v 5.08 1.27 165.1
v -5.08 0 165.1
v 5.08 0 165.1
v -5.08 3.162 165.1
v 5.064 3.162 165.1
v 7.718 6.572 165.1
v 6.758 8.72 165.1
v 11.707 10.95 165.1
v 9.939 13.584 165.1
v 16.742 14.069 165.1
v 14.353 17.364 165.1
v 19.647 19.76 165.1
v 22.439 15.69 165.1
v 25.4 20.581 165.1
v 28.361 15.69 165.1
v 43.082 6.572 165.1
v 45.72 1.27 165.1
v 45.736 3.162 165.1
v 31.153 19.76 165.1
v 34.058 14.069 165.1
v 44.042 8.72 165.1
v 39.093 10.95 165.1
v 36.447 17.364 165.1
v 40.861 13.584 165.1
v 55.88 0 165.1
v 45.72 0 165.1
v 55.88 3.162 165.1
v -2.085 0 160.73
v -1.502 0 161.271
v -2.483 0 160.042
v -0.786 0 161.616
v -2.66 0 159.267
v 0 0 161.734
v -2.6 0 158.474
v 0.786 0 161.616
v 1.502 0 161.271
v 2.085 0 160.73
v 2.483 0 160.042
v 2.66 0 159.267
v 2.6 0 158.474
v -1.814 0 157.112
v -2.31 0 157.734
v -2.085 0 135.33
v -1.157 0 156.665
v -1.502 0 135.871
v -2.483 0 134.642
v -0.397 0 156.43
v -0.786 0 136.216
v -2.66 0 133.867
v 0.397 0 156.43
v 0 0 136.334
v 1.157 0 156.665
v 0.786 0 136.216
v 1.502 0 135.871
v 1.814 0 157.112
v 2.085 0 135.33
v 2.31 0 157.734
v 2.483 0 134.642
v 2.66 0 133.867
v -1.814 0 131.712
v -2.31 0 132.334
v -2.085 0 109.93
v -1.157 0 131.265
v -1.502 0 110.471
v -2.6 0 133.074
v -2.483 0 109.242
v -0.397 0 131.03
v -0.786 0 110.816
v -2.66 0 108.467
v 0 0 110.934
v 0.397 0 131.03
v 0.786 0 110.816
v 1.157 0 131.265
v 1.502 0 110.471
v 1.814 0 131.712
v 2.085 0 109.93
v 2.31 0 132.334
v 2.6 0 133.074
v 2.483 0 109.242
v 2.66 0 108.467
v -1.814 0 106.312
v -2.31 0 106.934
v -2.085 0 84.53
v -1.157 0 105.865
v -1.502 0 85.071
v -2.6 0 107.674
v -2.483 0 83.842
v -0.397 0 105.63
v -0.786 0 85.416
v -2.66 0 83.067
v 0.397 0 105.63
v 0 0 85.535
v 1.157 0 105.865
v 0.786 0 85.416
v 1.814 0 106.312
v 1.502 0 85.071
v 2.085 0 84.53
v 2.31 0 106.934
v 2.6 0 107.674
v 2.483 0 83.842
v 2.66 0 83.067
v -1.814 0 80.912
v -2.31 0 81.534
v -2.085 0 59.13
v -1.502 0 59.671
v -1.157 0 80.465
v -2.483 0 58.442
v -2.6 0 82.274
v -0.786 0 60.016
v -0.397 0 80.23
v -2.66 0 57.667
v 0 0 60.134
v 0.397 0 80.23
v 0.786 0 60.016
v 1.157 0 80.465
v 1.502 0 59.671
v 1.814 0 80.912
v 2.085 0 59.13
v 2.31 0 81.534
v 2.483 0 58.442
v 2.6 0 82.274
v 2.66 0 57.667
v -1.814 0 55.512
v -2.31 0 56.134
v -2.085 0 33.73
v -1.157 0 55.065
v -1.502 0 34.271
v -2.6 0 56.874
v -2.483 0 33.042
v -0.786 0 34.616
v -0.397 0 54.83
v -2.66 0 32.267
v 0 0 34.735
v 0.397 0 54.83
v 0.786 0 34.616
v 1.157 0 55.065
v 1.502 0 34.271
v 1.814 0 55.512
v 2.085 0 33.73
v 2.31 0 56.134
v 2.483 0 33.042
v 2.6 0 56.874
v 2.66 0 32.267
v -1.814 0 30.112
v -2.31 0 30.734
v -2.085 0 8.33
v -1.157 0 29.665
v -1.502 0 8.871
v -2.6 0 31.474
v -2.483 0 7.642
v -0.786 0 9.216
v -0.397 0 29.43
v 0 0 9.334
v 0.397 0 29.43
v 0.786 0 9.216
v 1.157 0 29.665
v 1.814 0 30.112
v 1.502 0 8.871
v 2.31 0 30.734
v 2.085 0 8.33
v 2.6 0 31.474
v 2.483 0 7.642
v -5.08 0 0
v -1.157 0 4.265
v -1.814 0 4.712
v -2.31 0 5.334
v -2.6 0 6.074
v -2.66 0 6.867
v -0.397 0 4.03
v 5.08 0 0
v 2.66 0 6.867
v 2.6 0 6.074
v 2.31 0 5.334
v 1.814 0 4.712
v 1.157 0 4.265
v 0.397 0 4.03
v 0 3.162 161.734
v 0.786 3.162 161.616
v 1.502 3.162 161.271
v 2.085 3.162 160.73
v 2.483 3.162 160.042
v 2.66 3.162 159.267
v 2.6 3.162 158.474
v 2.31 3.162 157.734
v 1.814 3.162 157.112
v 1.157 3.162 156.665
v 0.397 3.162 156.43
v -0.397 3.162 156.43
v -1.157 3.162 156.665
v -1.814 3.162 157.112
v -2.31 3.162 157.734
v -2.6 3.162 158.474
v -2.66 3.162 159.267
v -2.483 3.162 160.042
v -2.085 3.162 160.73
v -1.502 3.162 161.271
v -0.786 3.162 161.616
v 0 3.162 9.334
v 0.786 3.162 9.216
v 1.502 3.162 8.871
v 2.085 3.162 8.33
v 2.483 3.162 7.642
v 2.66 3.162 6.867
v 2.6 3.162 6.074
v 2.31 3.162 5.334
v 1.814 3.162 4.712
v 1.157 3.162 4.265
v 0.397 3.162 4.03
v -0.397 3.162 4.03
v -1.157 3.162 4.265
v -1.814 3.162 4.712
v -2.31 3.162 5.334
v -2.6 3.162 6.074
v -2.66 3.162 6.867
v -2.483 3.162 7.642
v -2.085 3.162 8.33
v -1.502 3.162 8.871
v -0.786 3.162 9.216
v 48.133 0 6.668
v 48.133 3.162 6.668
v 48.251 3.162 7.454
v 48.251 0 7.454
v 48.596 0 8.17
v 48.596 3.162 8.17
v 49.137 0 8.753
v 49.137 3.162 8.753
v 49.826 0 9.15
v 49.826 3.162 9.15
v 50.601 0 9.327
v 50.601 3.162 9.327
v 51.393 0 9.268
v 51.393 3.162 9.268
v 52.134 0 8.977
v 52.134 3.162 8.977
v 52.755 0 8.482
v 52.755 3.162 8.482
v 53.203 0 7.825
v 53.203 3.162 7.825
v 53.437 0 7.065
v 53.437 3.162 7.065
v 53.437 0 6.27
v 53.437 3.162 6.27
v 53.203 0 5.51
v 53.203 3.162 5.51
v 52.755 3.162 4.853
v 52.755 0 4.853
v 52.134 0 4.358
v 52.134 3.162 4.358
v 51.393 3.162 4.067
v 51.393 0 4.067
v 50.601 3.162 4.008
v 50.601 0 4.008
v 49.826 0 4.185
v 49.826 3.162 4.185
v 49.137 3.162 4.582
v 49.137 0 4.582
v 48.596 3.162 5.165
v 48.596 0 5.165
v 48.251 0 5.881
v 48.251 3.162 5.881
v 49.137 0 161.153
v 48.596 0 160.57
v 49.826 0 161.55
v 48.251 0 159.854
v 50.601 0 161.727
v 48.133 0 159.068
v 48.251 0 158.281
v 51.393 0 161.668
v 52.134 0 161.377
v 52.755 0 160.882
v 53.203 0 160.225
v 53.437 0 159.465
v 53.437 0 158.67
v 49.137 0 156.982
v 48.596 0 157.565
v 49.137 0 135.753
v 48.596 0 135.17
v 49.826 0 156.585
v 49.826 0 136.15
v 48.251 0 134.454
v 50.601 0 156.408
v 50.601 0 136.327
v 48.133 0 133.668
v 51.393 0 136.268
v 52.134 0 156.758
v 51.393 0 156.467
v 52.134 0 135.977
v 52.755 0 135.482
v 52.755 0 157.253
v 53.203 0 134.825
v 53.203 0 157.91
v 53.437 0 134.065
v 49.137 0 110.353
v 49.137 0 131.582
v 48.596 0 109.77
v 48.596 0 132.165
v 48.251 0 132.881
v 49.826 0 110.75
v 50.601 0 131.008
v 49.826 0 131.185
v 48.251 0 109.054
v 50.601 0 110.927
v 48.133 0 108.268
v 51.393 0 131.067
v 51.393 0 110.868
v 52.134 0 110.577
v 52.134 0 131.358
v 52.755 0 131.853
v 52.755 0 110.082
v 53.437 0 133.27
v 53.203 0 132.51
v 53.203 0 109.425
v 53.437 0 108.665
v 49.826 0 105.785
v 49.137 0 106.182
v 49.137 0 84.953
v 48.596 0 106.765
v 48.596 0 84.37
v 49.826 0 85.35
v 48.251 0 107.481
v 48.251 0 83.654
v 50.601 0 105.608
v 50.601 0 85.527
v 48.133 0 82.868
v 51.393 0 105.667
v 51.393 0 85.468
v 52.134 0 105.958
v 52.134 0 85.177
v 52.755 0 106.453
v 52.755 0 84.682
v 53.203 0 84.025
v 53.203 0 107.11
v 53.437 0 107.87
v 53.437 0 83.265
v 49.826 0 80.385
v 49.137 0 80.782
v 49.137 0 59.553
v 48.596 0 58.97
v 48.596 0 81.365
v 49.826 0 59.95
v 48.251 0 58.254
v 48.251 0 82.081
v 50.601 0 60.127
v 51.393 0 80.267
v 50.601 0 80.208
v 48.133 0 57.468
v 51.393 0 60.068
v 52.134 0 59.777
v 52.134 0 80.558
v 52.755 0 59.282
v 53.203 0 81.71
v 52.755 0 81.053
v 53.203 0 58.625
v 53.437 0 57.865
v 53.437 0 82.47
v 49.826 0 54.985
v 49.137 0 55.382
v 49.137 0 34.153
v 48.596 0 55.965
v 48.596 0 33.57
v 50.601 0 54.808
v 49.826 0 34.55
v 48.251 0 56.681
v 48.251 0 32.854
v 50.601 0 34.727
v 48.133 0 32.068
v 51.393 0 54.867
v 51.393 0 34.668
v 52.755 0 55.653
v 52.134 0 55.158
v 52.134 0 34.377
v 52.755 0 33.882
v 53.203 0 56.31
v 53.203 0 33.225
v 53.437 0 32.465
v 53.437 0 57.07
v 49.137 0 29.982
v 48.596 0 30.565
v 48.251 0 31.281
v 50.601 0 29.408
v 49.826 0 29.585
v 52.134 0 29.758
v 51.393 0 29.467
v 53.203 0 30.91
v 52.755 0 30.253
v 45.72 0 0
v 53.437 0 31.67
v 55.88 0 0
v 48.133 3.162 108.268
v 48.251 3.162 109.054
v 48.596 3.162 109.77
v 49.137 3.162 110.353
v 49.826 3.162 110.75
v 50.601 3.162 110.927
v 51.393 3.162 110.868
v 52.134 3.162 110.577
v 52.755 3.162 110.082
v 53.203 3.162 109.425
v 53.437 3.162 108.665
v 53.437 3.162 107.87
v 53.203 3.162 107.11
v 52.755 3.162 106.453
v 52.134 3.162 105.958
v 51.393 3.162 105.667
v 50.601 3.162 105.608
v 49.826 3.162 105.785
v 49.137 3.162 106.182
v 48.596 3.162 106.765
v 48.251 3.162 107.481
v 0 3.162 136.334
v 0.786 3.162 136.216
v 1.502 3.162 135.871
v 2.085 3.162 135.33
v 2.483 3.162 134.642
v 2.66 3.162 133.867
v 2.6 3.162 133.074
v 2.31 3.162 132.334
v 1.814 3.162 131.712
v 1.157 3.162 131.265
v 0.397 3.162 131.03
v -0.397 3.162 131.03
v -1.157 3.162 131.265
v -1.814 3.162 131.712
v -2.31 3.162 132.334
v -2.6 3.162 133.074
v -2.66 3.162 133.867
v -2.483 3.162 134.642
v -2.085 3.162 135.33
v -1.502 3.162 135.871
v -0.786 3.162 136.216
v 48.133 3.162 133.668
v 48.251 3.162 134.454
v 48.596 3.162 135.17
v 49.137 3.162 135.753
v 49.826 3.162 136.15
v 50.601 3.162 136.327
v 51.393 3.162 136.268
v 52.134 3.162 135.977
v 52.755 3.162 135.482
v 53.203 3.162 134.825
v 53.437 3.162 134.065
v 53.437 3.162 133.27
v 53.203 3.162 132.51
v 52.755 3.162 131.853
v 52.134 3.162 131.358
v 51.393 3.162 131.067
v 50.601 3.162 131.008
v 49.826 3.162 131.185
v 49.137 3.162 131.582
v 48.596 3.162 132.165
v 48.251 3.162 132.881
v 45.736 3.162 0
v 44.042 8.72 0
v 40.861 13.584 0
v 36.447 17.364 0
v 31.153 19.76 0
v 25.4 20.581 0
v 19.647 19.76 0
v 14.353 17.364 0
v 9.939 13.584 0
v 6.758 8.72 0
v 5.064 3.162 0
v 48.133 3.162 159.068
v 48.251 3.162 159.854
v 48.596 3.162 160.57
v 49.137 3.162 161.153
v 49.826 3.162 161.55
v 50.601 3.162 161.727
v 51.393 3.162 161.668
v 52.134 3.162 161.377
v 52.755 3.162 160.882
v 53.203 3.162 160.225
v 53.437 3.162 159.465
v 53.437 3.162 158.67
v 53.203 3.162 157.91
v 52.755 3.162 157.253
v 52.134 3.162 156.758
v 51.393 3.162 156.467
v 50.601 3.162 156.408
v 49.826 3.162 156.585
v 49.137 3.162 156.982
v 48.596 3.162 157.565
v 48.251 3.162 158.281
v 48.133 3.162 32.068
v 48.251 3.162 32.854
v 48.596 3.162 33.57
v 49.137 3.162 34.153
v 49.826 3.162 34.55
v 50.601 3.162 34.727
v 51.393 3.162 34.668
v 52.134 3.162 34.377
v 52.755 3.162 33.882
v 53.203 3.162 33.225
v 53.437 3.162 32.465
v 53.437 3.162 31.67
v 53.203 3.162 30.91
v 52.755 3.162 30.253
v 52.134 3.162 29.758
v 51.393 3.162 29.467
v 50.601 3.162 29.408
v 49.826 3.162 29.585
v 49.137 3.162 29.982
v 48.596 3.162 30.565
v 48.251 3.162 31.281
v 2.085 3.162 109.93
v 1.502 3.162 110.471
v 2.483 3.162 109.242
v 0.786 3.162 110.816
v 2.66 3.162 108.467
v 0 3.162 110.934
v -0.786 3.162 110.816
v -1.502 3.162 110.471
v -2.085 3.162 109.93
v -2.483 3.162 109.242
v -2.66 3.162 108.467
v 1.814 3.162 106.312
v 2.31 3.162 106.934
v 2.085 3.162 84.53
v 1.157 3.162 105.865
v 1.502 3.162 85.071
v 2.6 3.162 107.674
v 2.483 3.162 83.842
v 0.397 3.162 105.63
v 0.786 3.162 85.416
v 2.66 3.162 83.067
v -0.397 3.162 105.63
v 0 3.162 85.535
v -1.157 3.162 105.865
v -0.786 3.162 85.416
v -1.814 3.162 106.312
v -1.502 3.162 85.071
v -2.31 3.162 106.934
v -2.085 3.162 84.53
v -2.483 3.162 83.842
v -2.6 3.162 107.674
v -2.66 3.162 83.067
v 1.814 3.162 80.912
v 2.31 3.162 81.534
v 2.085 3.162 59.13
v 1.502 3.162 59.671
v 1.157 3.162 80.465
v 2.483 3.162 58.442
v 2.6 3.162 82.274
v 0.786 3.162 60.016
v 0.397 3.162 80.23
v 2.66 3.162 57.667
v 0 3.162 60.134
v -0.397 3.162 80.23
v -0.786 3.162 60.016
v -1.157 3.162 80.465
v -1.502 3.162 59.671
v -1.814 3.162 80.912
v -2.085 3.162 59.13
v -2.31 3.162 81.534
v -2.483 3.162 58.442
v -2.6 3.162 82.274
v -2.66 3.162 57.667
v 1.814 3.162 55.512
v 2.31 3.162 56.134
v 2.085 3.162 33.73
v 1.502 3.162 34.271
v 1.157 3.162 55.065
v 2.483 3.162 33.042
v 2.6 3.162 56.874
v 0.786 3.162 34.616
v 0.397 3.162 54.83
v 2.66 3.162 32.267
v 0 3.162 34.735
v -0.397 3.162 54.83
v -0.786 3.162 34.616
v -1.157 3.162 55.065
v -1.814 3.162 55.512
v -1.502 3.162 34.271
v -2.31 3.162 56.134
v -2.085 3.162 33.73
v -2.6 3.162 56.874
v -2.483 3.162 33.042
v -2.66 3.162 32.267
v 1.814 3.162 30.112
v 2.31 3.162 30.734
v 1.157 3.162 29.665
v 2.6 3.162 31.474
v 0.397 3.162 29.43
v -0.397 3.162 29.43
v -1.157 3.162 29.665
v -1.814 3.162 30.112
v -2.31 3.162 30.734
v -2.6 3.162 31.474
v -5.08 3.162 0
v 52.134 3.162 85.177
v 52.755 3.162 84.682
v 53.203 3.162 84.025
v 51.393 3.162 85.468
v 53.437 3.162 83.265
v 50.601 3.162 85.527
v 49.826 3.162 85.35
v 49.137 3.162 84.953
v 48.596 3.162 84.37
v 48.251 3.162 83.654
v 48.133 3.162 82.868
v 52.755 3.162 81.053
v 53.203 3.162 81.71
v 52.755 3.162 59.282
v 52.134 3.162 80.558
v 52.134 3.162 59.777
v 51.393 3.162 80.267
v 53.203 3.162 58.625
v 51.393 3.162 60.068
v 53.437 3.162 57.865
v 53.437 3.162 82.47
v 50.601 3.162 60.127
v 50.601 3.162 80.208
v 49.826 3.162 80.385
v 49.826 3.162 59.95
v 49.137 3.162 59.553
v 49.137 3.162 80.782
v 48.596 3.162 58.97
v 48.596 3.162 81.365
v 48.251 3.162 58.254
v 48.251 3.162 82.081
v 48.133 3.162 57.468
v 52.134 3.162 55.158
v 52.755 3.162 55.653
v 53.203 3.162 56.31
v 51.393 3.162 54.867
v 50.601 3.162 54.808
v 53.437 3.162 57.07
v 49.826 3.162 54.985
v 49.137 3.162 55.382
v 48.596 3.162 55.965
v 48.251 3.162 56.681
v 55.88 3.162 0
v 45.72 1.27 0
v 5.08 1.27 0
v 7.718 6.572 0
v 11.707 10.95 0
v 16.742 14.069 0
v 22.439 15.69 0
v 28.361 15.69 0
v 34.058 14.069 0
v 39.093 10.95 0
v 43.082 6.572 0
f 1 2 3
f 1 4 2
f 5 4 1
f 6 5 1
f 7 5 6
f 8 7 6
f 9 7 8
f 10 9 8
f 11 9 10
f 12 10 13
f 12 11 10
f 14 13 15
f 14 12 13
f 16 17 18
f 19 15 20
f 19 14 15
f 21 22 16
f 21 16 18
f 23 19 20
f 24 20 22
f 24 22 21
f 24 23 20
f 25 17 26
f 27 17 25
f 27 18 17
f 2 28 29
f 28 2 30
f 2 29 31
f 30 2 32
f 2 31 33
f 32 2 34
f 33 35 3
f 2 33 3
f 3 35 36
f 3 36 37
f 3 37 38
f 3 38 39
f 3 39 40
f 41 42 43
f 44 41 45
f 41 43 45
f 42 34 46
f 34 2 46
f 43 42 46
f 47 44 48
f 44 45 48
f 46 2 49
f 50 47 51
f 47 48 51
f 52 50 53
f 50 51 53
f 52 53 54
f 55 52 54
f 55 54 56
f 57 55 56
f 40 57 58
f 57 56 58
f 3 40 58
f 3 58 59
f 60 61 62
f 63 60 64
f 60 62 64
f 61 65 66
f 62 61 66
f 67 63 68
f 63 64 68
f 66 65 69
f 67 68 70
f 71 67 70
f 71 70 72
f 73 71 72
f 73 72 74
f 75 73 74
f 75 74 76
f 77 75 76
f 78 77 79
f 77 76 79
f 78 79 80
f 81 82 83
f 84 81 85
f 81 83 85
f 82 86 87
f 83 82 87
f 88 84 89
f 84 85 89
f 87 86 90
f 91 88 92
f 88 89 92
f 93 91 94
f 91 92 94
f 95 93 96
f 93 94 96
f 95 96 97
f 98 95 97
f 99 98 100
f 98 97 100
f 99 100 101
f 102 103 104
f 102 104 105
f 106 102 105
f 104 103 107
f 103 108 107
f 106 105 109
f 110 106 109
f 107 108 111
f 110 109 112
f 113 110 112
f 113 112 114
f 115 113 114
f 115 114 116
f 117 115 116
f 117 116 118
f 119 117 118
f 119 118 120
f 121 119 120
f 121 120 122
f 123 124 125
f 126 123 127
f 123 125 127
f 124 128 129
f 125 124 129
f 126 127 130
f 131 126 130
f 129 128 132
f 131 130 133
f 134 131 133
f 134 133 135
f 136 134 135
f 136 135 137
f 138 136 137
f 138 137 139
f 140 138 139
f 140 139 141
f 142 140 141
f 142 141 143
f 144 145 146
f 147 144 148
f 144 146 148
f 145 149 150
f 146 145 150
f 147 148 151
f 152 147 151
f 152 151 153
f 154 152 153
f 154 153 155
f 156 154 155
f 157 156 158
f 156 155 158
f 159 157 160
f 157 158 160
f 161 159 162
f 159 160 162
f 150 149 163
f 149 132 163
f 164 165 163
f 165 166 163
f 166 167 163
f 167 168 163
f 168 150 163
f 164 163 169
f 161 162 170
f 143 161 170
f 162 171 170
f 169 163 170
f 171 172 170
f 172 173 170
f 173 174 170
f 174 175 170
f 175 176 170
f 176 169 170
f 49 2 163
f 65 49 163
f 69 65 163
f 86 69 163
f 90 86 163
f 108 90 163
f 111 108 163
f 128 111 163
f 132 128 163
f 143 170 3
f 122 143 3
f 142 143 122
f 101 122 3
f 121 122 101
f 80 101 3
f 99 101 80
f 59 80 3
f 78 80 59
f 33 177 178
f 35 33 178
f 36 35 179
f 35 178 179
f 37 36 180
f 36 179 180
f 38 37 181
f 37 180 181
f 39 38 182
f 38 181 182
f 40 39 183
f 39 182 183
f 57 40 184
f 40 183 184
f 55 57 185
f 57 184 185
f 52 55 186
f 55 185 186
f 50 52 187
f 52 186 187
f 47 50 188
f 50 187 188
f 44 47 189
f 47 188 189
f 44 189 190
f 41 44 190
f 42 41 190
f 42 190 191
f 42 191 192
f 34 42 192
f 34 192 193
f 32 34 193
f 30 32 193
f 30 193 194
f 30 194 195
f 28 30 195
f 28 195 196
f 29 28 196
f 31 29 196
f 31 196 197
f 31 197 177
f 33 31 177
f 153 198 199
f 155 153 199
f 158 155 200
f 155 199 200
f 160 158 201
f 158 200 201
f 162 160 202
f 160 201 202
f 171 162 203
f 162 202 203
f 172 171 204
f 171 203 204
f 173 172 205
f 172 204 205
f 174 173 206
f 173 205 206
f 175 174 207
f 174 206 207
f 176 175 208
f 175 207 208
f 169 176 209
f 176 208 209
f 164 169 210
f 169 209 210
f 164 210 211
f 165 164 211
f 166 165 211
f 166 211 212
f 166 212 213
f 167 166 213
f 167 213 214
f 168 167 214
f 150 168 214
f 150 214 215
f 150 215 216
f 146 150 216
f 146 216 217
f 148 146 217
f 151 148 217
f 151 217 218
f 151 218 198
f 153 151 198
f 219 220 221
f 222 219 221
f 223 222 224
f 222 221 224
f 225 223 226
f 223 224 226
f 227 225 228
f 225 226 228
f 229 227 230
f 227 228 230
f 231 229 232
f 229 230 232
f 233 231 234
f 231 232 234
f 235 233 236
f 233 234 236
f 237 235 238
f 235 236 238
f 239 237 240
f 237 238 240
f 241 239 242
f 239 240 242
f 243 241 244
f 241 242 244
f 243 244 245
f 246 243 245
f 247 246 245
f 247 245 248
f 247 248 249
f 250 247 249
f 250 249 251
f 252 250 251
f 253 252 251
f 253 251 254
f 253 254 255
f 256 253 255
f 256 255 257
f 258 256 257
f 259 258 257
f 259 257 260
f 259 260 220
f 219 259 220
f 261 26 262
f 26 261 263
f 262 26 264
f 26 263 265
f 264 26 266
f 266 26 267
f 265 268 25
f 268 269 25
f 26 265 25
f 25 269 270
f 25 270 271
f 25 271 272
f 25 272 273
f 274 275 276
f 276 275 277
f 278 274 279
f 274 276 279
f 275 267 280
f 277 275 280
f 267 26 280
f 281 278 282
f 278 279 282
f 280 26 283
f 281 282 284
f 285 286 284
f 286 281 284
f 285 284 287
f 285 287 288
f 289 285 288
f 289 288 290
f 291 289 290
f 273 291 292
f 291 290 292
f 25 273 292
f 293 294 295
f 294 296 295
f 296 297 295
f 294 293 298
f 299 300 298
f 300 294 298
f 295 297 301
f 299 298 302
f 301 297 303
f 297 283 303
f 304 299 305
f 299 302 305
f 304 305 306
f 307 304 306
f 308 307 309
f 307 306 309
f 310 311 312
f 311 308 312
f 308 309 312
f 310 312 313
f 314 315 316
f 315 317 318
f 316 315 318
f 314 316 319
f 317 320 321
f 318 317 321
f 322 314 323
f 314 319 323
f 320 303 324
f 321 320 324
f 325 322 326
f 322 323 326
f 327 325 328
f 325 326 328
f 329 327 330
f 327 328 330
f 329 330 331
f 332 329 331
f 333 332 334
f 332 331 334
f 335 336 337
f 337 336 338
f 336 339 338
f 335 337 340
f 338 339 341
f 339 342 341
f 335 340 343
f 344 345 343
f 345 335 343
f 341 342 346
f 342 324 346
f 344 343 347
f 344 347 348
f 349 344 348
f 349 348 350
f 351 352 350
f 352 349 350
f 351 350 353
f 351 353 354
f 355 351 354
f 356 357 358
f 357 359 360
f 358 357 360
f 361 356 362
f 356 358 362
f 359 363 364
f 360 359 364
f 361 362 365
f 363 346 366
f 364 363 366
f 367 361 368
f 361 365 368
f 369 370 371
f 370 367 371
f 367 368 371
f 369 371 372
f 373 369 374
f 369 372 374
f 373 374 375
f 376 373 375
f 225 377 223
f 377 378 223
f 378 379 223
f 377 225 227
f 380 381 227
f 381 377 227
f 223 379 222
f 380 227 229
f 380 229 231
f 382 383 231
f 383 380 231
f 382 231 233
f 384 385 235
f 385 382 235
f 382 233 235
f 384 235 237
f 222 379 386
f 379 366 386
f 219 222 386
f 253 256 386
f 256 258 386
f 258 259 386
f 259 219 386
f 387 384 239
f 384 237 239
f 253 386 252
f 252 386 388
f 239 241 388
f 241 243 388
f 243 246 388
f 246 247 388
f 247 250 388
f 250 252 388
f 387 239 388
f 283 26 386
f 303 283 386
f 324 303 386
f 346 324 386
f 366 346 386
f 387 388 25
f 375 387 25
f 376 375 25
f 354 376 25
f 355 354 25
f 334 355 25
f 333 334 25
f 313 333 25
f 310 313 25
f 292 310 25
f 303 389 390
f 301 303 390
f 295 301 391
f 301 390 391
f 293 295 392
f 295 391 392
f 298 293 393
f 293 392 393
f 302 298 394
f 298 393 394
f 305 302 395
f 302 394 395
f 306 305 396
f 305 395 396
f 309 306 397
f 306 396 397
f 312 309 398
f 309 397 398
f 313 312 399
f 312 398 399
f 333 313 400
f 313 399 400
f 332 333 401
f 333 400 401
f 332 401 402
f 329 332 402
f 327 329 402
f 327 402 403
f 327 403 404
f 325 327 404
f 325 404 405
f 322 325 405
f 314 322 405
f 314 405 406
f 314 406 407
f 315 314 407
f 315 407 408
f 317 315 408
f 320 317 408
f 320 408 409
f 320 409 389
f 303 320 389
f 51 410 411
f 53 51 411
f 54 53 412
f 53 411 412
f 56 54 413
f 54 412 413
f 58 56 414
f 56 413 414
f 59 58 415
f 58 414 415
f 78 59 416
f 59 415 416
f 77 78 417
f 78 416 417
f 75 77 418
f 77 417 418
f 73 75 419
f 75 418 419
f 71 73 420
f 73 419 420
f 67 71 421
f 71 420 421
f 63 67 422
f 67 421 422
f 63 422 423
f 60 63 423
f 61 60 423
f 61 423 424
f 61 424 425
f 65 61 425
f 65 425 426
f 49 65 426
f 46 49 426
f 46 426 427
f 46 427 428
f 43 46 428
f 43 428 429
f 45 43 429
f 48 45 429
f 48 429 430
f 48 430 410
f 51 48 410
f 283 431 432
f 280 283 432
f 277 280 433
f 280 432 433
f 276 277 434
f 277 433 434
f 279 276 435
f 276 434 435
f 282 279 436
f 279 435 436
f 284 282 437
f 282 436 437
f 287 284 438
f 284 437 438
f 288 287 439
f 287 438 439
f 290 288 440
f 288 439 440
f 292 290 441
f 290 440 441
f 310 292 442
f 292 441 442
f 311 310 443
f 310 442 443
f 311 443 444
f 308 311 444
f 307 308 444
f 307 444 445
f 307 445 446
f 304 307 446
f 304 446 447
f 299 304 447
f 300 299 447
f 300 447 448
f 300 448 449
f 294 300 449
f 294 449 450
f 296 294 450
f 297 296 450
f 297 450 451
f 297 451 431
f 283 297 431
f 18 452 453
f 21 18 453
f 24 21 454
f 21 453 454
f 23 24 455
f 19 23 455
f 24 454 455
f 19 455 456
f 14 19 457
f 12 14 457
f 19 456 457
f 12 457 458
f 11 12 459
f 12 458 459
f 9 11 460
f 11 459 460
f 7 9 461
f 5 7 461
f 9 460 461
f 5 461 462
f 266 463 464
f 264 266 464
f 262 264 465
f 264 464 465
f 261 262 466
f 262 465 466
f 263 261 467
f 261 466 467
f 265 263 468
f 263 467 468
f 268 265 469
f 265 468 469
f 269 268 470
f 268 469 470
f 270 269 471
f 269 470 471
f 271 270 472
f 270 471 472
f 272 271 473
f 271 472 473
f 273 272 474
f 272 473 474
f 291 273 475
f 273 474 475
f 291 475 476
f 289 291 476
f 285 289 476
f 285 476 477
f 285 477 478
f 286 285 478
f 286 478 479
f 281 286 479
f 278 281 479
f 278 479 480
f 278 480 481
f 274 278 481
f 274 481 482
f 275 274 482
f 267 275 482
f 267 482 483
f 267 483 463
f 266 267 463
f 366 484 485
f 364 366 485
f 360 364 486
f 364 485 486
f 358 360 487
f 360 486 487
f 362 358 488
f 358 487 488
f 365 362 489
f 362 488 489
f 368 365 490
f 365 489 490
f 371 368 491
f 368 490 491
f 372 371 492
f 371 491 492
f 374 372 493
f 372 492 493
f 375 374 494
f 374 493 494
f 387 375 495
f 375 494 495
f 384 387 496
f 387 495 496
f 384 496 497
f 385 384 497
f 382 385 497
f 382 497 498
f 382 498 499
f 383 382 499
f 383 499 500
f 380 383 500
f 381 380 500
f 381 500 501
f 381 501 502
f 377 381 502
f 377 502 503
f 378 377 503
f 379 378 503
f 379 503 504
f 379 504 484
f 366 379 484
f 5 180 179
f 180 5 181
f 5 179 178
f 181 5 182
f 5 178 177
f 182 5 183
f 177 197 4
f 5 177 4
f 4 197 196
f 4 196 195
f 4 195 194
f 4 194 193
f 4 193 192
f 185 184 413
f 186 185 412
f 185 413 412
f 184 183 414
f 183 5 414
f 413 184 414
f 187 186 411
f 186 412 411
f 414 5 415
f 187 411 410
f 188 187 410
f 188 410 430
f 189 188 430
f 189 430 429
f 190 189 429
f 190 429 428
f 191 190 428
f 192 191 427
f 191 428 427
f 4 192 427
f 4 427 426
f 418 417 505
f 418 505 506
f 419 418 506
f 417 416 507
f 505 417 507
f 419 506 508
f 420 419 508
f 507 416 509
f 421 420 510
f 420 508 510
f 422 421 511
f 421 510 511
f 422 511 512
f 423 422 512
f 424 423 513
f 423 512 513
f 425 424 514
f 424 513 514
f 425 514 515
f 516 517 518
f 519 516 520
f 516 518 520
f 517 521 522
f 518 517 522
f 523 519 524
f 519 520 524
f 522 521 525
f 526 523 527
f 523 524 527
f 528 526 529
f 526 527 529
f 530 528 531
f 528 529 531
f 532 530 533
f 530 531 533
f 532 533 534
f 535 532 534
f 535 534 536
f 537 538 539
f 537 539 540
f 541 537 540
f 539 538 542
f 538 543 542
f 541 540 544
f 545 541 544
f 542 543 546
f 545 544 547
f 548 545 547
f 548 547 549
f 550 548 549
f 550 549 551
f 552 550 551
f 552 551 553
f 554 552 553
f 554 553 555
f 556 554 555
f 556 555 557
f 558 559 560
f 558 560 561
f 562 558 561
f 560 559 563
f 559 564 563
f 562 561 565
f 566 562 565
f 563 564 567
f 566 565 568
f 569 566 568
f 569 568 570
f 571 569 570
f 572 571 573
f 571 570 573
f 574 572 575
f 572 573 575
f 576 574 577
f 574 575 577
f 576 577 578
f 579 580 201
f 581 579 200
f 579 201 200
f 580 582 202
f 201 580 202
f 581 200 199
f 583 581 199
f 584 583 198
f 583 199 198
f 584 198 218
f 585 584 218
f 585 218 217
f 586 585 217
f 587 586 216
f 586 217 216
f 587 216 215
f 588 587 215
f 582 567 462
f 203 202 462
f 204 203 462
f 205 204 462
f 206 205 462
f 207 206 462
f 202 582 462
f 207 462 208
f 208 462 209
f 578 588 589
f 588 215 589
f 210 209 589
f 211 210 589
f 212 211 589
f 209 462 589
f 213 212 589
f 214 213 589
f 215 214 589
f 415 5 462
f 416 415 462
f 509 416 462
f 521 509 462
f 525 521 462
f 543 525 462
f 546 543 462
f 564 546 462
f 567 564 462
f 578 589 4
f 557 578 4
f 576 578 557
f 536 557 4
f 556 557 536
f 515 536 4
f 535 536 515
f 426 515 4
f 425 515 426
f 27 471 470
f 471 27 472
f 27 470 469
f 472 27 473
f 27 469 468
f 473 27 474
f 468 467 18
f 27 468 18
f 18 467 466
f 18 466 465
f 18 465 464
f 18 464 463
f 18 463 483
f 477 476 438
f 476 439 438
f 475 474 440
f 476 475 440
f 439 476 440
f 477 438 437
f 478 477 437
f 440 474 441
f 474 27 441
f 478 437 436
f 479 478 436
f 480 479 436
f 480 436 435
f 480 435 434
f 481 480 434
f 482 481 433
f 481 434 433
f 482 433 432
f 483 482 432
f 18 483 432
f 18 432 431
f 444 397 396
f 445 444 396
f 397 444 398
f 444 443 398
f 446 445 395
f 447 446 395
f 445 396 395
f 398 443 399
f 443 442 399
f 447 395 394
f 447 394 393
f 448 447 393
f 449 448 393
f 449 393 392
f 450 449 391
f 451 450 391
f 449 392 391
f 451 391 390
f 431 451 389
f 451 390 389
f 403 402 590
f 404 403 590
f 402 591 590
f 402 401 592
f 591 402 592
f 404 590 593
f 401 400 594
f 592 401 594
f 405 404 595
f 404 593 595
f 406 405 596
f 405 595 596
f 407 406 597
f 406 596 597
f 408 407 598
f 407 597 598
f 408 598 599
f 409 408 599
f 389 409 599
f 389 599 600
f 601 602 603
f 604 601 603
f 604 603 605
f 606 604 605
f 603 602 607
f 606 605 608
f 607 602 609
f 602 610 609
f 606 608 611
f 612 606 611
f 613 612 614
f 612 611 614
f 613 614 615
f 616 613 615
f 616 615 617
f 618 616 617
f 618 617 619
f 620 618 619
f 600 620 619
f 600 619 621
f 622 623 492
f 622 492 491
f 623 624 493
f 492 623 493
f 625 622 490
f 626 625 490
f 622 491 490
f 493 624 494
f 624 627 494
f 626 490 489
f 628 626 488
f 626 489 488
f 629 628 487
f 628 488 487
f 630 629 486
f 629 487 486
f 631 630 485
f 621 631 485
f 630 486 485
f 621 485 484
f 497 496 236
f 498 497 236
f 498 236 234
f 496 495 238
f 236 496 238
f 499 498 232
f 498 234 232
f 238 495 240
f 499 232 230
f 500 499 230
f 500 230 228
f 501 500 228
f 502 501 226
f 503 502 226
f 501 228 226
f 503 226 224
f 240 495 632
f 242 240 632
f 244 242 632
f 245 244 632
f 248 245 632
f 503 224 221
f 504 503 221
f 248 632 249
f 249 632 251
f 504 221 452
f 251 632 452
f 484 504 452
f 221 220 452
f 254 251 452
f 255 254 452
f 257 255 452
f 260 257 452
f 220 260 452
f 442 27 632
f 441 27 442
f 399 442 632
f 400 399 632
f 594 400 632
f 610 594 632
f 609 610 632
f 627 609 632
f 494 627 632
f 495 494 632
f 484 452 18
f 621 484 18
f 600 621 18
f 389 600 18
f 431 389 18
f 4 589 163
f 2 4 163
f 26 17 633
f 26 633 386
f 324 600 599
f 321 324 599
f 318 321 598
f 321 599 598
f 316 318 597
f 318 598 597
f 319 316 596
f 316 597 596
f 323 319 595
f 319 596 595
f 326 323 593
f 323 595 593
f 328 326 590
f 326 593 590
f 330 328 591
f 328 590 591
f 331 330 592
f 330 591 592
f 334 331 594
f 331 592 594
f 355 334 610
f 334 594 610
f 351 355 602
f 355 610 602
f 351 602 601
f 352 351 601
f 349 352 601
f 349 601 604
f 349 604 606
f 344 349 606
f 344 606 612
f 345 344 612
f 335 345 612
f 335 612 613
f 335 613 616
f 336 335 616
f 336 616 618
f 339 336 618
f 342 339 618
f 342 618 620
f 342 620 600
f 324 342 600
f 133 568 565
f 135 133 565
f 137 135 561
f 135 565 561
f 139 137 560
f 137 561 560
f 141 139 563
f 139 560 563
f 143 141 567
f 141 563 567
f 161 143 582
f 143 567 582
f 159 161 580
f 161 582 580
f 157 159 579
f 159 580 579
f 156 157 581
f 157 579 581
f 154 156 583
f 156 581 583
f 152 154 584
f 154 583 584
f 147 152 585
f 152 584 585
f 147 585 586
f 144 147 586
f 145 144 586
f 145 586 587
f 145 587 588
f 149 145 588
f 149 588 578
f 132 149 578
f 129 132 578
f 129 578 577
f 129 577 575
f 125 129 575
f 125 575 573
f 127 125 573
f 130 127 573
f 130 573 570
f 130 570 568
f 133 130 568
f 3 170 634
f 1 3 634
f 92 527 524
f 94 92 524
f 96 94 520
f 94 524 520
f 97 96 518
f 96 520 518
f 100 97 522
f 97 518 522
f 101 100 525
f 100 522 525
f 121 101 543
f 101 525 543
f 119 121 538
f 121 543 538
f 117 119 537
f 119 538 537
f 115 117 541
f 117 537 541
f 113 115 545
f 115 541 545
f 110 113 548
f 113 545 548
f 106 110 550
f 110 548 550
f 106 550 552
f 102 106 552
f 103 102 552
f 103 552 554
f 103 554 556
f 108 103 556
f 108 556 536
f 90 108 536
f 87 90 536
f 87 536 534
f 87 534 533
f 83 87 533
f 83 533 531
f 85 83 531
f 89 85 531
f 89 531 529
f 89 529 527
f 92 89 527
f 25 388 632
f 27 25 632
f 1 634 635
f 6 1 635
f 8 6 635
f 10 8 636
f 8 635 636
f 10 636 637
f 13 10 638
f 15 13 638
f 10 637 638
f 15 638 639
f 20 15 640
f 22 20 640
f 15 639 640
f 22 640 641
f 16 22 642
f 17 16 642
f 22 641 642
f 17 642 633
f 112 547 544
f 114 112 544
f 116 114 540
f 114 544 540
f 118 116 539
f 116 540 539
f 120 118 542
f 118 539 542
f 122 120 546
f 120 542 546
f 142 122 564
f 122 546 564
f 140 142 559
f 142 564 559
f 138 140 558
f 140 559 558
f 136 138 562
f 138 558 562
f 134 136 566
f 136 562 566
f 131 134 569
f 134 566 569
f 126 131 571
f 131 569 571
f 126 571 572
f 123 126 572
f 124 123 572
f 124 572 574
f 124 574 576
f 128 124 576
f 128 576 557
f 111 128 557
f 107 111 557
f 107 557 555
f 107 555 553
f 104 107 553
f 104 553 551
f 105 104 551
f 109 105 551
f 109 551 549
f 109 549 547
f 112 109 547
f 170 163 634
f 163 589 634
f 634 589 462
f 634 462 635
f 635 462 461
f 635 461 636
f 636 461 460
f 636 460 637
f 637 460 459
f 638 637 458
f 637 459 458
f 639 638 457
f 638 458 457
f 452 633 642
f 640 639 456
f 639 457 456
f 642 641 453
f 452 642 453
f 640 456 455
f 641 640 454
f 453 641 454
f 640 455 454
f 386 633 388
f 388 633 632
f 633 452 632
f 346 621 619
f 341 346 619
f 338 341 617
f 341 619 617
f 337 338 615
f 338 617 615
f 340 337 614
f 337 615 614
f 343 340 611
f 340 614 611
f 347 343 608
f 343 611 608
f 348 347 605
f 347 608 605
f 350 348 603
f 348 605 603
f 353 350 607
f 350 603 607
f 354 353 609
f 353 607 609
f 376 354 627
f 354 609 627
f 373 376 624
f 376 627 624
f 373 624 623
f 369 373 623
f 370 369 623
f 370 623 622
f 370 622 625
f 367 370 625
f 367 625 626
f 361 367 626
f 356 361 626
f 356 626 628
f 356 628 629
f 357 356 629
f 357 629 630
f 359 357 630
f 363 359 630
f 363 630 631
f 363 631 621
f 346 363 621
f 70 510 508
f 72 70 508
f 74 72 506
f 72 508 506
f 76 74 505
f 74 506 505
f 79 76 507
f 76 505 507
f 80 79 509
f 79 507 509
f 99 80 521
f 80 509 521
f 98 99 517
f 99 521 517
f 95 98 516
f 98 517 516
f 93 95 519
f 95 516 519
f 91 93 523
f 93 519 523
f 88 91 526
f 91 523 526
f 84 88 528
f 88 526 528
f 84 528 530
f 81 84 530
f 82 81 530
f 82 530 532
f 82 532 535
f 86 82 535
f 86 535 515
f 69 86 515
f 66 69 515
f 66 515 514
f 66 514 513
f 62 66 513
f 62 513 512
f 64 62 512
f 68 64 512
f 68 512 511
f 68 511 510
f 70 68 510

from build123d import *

# Parameters (mm, degrees)
BOSS_EXTRUDE1_DEPTH = 165.1
SKETCH3_R           = 2.667
CUT_EXTRUDE1_DEPTH  = 165.1


with BuildPart() as part:
    # Sketch1 → Boss-Extrude1 (new body)
    with BuildSketch(Plane.XY):
        with BuildLine():
            Line((-5.08, 0), (5.08, 0))
            Line((5.08, 0), (5.08, 1.27))
            ThreePointArc((5.08, 1.27), (25.4, 15.895452724), (45.72, 1.27))
            Line((45.72, 1.27), (45.72, 0))
            Line((45.72, 0), (55.88, 0))
            Line((55.88, 0), (55.88, 3.161651537))
            Line((55.88, 3.161651537), (45.736301675, 3.161651537))
            ThreePointArc((45.736301675, 3.161651537), (25.4, 20.58060267), (5.063698325, 3.161651537))
            Line((5.063698325, 3.161651537), (-5.08, 3.161651537))
            Line((-5.08, 3.161651537), (-5.08, 0))
        make_face()
    extrude(amount=BOSS_EXTRUDE1_DEPTH)

    # Sketch3 → Cut-Extrude1 (cut)
    with BuildSketch(Plane(origin=(0, 3.161651537, 0), x_dir=(1, 0, 0), z_dir=(0, 1, 0))):
        with Locations(Location((0, -6.6675, 0), (0, 0, 270))):
            Circle(SKETCH3_R)
        with Locations(Location((0, -32.0675, 0), (0, 0, 270))):
            Circle(SKETCH3_R)
        with Locations(Location((0, -57.4675, 0), (0, 0, 270))):
            Circle(SKETCH3_R)
        with Locations(Location((0, -82.8675, 0), (0, 0, 270))):
            Circle(SKETCH3_R)
        with Locations(Location((0, -108.2675, 0), (0, 0, 270))):
            Circle(SKETCH3_R)
        with Locations(Location((0, -133.6675, 0), (0, 0, 270))):
            Circle(SKETCH3_R)
        with Locations(Location((0, -159.0675, 0), (0, 0, 270))):
            Circle(SKETCH3_R)
        with Locations(Location((50.8, -159.0675, 0), (0, 0, 180))):
            Circle(SKETCH3_R)
        with Locations(Location((50.8, -133.6675, 0), (0, 0, 180))):
            Circle(SKETCH3_R)
        with Locations(Location((50.8, -108.2675, 0), (0, 0, 180))):
            Circle(SKETCH3_R)
        with Locations(Location((50.8, -82.8675, 0), (0, 0, 180))):
            Circle(SKETCH3_R)
        with Locations(Location((50.8, -57.4675, 0), (0, 0, 180))):
            Circle(SKETCH3_R)
        with Locations(Location((50.8, -32.0675, 0), (0, 0, 180))):
            Circle(SKETCH3_R)
        with Locations(Location((50.8, -6.6675, 0), (0, 0, 180))):
            Circle(SKETCH3_R)
    extrude(amount=-CUT_EXTRUDE1_DEPTH, mode=Mode.SUBTRACT)


solid = part.part
